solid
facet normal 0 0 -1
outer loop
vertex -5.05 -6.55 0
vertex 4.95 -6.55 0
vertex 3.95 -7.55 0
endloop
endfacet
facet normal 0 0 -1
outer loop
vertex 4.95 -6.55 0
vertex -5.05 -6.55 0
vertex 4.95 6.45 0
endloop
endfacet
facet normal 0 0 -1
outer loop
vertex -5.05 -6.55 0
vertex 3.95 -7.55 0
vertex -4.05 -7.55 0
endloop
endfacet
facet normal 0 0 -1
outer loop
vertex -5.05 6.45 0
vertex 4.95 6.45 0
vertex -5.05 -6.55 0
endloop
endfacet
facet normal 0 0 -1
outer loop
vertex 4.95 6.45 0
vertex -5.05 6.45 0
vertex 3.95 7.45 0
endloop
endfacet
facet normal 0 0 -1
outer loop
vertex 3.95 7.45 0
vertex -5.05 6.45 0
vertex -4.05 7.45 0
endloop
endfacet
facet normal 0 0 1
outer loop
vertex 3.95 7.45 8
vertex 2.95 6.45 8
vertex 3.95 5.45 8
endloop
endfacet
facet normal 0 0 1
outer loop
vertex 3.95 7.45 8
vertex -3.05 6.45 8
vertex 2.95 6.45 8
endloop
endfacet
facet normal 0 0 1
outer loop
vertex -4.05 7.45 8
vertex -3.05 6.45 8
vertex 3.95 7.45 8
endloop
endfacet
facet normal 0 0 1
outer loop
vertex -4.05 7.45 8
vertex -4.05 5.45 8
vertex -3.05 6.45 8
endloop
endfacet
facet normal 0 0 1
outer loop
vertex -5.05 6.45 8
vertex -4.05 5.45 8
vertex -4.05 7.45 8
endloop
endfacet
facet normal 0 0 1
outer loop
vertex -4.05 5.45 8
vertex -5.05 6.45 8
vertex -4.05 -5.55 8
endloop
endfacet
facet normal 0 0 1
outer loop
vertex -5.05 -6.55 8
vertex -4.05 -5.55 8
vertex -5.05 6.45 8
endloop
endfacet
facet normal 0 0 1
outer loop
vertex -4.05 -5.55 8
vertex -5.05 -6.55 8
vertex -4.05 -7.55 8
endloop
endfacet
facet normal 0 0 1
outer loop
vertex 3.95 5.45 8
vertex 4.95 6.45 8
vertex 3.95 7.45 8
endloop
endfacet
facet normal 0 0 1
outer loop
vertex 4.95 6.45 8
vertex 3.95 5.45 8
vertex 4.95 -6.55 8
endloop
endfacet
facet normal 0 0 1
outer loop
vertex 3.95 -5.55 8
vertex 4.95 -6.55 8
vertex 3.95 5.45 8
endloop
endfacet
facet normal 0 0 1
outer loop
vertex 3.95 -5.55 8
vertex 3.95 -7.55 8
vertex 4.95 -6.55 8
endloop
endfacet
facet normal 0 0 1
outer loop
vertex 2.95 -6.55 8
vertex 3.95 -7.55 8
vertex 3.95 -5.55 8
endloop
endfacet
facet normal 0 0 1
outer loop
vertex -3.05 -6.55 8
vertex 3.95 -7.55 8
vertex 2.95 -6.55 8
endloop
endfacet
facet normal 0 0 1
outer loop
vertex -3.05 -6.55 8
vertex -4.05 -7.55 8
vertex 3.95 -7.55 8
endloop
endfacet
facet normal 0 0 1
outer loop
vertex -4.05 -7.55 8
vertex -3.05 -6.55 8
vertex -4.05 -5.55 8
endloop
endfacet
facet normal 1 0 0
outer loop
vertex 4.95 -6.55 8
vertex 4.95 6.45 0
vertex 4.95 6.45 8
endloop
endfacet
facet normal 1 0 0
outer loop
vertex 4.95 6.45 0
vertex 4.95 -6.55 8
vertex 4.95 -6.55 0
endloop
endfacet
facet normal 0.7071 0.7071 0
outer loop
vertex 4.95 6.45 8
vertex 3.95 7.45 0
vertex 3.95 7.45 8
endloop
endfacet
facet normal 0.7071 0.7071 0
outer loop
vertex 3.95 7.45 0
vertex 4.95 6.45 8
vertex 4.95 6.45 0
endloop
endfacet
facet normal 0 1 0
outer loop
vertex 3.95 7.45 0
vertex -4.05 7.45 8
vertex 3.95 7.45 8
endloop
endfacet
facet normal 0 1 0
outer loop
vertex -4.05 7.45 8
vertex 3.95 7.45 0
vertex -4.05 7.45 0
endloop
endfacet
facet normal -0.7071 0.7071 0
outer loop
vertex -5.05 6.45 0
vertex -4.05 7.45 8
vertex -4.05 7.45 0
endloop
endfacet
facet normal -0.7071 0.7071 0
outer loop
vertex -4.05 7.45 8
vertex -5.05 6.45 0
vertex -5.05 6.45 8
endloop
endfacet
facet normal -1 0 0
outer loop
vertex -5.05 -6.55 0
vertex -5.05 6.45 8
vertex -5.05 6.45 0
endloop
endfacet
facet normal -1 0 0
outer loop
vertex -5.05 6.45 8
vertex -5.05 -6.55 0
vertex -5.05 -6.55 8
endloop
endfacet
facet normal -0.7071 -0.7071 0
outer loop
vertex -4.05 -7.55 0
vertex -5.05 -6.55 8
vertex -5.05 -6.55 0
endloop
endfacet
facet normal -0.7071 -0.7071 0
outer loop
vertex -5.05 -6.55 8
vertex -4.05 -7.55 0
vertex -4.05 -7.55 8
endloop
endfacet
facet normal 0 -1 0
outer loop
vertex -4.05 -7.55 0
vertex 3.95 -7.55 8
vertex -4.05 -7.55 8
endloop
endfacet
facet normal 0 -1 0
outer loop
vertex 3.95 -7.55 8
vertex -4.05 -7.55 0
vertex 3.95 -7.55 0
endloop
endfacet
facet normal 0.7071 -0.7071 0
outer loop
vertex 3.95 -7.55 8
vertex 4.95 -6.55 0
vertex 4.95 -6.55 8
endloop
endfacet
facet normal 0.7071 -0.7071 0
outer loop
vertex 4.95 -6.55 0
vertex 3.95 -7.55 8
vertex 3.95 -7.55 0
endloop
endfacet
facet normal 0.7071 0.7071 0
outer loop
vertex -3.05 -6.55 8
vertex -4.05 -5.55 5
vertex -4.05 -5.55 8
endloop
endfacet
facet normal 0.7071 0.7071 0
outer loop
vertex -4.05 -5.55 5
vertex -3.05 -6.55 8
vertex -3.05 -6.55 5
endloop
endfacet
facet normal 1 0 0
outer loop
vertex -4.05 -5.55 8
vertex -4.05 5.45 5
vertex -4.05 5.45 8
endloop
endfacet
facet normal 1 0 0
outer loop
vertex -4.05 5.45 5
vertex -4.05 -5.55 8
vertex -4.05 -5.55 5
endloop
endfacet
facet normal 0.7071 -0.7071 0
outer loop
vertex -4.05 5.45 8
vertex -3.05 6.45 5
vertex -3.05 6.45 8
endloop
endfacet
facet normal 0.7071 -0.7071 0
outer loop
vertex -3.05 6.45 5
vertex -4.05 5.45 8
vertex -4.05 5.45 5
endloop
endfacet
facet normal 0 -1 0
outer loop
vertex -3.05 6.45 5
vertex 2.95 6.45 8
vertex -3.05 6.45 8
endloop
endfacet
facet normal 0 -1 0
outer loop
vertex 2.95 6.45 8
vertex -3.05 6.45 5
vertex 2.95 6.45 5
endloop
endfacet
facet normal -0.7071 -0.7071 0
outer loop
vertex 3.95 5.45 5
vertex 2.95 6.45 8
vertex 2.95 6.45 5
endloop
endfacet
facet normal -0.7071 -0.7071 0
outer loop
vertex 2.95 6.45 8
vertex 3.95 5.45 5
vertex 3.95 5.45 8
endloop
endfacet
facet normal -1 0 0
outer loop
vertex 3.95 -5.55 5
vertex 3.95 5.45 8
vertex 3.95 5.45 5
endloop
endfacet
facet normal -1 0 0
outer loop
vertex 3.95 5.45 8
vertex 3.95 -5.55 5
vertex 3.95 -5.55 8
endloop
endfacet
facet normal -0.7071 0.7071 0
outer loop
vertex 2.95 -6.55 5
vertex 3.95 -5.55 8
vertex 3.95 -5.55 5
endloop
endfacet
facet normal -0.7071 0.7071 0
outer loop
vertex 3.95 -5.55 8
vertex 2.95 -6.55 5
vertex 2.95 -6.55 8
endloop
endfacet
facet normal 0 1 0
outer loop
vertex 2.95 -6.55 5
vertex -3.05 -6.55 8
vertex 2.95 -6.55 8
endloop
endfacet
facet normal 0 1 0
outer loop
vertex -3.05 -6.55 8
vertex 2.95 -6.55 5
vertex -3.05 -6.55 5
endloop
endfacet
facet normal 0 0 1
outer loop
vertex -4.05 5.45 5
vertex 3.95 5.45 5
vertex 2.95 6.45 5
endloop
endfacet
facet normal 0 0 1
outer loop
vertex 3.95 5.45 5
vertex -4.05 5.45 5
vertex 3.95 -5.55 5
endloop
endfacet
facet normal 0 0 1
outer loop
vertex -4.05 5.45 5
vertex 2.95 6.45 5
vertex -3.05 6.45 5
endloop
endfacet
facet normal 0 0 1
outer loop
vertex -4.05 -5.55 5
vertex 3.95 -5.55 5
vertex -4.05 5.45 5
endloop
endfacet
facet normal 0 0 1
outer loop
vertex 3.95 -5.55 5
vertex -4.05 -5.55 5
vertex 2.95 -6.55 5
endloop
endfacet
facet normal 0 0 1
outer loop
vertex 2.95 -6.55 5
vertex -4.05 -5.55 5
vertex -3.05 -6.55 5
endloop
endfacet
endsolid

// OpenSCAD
//start
module  module1() 
{ 
color  ([1,0.3058823529411765,0.9176470588235294]) 
{ 
      linear_extrude( height = 8, center=false, convexity = 10, twist = 0, $fn = 10) 
            polygon(points = [
[-5.05,6.45]
,[-4.05,7.45]
,[3.95,7.45]
,[4.95,6.45]
,[4.95,-6.55]
,[3.95,-7.55]
,[-4.05,-7.55]
,[-5.05,-6.55]
,[-3.05,6.45]
,[-4.05,5.45]
,[-4.05,-5.55]
,[-3.05,-6.55]
,[2.95,-6.55]
,[3.95,-5.55]
,[3.95,5.45]
,[2.95,6.45]
]
,paths = [
[0,1,2,3,4,5,6,7],[8,9,10,11,12,13,14,15]]
            );
}
}
//start
module  module2() 
{ 
color  ([0.2,0,0.4]) 
{ 
      linear_extrude( height = 5, center=false, convexity = 10, twist = 0, $fn = 10) 
            polygon(points = [
[-4.50,5.85]
,[-3.40,6.85]
,[3.05,6.95]
,[4.25,5.75]
,[4.30,-5.75]
,[3.25,-6.90]
,[-3.45,-6.75]
,[-4.50,-5.70]
]
,paths = [
[0,1,2,3,4,5,6,7]]
            );
}
}
//start
module1(); 
//start
module2(); 
